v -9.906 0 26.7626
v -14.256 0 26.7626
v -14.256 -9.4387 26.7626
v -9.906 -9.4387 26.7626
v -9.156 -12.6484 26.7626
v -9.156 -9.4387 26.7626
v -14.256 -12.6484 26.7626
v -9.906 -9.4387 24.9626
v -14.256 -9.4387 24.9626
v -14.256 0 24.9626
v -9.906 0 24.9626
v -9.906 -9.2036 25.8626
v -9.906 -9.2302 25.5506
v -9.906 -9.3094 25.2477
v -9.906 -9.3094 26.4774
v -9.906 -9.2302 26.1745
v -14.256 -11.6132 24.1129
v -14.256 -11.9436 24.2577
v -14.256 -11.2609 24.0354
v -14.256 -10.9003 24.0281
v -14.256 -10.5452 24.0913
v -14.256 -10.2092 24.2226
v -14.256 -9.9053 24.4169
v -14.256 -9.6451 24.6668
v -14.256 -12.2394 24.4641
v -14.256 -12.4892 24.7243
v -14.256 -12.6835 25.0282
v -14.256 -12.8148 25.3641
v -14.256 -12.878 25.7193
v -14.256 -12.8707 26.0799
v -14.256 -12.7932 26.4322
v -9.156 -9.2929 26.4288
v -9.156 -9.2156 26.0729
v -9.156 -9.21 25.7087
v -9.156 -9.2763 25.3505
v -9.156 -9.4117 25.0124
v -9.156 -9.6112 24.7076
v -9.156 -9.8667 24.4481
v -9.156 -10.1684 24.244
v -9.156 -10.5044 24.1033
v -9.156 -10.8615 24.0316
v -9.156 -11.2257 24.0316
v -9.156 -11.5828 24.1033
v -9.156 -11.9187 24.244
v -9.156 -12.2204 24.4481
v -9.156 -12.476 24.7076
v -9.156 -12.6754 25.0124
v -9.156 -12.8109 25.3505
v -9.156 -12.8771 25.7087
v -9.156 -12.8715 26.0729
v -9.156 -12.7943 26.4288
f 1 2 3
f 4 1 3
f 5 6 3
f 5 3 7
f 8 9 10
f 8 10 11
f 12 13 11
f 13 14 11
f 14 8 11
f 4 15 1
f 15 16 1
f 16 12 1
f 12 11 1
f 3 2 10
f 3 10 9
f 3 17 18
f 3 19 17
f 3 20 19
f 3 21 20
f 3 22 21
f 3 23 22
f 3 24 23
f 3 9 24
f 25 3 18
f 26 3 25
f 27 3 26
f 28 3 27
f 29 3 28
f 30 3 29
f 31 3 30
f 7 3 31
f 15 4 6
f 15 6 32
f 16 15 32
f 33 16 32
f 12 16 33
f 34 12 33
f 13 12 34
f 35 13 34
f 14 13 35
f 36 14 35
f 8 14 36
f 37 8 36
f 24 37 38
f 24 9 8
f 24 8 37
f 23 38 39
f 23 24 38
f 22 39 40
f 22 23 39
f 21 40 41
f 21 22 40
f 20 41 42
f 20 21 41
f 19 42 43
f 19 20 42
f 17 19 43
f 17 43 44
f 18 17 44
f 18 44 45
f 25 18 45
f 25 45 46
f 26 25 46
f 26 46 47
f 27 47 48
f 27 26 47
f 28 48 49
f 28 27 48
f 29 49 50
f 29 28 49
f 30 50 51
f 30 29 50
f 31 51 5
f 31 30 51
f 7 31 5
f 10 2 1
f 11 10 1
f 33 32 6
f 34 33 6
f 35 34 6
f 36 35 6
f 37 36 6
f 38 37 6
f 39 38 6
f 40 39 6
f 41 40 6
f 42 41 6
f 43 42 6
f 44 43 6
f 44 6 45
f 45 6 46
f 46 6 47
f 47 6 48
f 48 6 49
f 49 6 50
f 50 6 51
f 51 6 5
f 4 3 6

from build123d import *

# Parameters (mm, degrees)
F0_W     = 4.35
F0_H     = 1.8
F1_DEPTH = 11.7
F2_R     = 1.84
F3_DEPTH = 5.1
F5_DEPTH = 25
F6_W     = 5.1
F6_H     = 0.197361
F7_DEPTH = 25


with BuildPart() as f1:
    # F0 (on Front) → F1 (new body)
    with BuildSketch(Plane.XZ):
        with Locations((-12.080966, 25.862558)):
            Rectangle(F0_W, F0_H)
    extrude(amount=F1_DEPTH)

    # F2 (on face) → F3 (join)
    with BuildSketch(Plane(origin=(-14.255966, 0, 0), x_dir=(0, -1, 0), z_dir=(-1, 0, 0))):
        with Locations((11.043573, 25.862558)):
            Circle(F2_R)
    extrude(amount=-F3_DEPTH)

    # F4 (on face) → F5 (cut)
    with BuildSketch(Plane(origin=(-14.255966, 0, 0), x_dir=(0, -1, 0), z_dir=(-1, 0, 0))):
        Polygon((10.555248, 28.524822), (9.438705, 26.762558), (31.722508, 26.762558), align=None)
    extrude(amount=-F5_DEPTH, mode=Mode.SUBTRACT)

    # F6 (on face) → F7 (cut)
    with BuildSketch(Plane(origin=(0, 5.36427, 3.39872), x_dir=(1, 0, 0), z_dir=(0, -0.844723, -0.535204))):
        with Locations((-11.705966, 27.757259)):
            Rectangle(F6_W, F6_H)
    extrude(amount=-F7_DEPTH, mode=Mode.SUBTRACT)


solid = f1.part
